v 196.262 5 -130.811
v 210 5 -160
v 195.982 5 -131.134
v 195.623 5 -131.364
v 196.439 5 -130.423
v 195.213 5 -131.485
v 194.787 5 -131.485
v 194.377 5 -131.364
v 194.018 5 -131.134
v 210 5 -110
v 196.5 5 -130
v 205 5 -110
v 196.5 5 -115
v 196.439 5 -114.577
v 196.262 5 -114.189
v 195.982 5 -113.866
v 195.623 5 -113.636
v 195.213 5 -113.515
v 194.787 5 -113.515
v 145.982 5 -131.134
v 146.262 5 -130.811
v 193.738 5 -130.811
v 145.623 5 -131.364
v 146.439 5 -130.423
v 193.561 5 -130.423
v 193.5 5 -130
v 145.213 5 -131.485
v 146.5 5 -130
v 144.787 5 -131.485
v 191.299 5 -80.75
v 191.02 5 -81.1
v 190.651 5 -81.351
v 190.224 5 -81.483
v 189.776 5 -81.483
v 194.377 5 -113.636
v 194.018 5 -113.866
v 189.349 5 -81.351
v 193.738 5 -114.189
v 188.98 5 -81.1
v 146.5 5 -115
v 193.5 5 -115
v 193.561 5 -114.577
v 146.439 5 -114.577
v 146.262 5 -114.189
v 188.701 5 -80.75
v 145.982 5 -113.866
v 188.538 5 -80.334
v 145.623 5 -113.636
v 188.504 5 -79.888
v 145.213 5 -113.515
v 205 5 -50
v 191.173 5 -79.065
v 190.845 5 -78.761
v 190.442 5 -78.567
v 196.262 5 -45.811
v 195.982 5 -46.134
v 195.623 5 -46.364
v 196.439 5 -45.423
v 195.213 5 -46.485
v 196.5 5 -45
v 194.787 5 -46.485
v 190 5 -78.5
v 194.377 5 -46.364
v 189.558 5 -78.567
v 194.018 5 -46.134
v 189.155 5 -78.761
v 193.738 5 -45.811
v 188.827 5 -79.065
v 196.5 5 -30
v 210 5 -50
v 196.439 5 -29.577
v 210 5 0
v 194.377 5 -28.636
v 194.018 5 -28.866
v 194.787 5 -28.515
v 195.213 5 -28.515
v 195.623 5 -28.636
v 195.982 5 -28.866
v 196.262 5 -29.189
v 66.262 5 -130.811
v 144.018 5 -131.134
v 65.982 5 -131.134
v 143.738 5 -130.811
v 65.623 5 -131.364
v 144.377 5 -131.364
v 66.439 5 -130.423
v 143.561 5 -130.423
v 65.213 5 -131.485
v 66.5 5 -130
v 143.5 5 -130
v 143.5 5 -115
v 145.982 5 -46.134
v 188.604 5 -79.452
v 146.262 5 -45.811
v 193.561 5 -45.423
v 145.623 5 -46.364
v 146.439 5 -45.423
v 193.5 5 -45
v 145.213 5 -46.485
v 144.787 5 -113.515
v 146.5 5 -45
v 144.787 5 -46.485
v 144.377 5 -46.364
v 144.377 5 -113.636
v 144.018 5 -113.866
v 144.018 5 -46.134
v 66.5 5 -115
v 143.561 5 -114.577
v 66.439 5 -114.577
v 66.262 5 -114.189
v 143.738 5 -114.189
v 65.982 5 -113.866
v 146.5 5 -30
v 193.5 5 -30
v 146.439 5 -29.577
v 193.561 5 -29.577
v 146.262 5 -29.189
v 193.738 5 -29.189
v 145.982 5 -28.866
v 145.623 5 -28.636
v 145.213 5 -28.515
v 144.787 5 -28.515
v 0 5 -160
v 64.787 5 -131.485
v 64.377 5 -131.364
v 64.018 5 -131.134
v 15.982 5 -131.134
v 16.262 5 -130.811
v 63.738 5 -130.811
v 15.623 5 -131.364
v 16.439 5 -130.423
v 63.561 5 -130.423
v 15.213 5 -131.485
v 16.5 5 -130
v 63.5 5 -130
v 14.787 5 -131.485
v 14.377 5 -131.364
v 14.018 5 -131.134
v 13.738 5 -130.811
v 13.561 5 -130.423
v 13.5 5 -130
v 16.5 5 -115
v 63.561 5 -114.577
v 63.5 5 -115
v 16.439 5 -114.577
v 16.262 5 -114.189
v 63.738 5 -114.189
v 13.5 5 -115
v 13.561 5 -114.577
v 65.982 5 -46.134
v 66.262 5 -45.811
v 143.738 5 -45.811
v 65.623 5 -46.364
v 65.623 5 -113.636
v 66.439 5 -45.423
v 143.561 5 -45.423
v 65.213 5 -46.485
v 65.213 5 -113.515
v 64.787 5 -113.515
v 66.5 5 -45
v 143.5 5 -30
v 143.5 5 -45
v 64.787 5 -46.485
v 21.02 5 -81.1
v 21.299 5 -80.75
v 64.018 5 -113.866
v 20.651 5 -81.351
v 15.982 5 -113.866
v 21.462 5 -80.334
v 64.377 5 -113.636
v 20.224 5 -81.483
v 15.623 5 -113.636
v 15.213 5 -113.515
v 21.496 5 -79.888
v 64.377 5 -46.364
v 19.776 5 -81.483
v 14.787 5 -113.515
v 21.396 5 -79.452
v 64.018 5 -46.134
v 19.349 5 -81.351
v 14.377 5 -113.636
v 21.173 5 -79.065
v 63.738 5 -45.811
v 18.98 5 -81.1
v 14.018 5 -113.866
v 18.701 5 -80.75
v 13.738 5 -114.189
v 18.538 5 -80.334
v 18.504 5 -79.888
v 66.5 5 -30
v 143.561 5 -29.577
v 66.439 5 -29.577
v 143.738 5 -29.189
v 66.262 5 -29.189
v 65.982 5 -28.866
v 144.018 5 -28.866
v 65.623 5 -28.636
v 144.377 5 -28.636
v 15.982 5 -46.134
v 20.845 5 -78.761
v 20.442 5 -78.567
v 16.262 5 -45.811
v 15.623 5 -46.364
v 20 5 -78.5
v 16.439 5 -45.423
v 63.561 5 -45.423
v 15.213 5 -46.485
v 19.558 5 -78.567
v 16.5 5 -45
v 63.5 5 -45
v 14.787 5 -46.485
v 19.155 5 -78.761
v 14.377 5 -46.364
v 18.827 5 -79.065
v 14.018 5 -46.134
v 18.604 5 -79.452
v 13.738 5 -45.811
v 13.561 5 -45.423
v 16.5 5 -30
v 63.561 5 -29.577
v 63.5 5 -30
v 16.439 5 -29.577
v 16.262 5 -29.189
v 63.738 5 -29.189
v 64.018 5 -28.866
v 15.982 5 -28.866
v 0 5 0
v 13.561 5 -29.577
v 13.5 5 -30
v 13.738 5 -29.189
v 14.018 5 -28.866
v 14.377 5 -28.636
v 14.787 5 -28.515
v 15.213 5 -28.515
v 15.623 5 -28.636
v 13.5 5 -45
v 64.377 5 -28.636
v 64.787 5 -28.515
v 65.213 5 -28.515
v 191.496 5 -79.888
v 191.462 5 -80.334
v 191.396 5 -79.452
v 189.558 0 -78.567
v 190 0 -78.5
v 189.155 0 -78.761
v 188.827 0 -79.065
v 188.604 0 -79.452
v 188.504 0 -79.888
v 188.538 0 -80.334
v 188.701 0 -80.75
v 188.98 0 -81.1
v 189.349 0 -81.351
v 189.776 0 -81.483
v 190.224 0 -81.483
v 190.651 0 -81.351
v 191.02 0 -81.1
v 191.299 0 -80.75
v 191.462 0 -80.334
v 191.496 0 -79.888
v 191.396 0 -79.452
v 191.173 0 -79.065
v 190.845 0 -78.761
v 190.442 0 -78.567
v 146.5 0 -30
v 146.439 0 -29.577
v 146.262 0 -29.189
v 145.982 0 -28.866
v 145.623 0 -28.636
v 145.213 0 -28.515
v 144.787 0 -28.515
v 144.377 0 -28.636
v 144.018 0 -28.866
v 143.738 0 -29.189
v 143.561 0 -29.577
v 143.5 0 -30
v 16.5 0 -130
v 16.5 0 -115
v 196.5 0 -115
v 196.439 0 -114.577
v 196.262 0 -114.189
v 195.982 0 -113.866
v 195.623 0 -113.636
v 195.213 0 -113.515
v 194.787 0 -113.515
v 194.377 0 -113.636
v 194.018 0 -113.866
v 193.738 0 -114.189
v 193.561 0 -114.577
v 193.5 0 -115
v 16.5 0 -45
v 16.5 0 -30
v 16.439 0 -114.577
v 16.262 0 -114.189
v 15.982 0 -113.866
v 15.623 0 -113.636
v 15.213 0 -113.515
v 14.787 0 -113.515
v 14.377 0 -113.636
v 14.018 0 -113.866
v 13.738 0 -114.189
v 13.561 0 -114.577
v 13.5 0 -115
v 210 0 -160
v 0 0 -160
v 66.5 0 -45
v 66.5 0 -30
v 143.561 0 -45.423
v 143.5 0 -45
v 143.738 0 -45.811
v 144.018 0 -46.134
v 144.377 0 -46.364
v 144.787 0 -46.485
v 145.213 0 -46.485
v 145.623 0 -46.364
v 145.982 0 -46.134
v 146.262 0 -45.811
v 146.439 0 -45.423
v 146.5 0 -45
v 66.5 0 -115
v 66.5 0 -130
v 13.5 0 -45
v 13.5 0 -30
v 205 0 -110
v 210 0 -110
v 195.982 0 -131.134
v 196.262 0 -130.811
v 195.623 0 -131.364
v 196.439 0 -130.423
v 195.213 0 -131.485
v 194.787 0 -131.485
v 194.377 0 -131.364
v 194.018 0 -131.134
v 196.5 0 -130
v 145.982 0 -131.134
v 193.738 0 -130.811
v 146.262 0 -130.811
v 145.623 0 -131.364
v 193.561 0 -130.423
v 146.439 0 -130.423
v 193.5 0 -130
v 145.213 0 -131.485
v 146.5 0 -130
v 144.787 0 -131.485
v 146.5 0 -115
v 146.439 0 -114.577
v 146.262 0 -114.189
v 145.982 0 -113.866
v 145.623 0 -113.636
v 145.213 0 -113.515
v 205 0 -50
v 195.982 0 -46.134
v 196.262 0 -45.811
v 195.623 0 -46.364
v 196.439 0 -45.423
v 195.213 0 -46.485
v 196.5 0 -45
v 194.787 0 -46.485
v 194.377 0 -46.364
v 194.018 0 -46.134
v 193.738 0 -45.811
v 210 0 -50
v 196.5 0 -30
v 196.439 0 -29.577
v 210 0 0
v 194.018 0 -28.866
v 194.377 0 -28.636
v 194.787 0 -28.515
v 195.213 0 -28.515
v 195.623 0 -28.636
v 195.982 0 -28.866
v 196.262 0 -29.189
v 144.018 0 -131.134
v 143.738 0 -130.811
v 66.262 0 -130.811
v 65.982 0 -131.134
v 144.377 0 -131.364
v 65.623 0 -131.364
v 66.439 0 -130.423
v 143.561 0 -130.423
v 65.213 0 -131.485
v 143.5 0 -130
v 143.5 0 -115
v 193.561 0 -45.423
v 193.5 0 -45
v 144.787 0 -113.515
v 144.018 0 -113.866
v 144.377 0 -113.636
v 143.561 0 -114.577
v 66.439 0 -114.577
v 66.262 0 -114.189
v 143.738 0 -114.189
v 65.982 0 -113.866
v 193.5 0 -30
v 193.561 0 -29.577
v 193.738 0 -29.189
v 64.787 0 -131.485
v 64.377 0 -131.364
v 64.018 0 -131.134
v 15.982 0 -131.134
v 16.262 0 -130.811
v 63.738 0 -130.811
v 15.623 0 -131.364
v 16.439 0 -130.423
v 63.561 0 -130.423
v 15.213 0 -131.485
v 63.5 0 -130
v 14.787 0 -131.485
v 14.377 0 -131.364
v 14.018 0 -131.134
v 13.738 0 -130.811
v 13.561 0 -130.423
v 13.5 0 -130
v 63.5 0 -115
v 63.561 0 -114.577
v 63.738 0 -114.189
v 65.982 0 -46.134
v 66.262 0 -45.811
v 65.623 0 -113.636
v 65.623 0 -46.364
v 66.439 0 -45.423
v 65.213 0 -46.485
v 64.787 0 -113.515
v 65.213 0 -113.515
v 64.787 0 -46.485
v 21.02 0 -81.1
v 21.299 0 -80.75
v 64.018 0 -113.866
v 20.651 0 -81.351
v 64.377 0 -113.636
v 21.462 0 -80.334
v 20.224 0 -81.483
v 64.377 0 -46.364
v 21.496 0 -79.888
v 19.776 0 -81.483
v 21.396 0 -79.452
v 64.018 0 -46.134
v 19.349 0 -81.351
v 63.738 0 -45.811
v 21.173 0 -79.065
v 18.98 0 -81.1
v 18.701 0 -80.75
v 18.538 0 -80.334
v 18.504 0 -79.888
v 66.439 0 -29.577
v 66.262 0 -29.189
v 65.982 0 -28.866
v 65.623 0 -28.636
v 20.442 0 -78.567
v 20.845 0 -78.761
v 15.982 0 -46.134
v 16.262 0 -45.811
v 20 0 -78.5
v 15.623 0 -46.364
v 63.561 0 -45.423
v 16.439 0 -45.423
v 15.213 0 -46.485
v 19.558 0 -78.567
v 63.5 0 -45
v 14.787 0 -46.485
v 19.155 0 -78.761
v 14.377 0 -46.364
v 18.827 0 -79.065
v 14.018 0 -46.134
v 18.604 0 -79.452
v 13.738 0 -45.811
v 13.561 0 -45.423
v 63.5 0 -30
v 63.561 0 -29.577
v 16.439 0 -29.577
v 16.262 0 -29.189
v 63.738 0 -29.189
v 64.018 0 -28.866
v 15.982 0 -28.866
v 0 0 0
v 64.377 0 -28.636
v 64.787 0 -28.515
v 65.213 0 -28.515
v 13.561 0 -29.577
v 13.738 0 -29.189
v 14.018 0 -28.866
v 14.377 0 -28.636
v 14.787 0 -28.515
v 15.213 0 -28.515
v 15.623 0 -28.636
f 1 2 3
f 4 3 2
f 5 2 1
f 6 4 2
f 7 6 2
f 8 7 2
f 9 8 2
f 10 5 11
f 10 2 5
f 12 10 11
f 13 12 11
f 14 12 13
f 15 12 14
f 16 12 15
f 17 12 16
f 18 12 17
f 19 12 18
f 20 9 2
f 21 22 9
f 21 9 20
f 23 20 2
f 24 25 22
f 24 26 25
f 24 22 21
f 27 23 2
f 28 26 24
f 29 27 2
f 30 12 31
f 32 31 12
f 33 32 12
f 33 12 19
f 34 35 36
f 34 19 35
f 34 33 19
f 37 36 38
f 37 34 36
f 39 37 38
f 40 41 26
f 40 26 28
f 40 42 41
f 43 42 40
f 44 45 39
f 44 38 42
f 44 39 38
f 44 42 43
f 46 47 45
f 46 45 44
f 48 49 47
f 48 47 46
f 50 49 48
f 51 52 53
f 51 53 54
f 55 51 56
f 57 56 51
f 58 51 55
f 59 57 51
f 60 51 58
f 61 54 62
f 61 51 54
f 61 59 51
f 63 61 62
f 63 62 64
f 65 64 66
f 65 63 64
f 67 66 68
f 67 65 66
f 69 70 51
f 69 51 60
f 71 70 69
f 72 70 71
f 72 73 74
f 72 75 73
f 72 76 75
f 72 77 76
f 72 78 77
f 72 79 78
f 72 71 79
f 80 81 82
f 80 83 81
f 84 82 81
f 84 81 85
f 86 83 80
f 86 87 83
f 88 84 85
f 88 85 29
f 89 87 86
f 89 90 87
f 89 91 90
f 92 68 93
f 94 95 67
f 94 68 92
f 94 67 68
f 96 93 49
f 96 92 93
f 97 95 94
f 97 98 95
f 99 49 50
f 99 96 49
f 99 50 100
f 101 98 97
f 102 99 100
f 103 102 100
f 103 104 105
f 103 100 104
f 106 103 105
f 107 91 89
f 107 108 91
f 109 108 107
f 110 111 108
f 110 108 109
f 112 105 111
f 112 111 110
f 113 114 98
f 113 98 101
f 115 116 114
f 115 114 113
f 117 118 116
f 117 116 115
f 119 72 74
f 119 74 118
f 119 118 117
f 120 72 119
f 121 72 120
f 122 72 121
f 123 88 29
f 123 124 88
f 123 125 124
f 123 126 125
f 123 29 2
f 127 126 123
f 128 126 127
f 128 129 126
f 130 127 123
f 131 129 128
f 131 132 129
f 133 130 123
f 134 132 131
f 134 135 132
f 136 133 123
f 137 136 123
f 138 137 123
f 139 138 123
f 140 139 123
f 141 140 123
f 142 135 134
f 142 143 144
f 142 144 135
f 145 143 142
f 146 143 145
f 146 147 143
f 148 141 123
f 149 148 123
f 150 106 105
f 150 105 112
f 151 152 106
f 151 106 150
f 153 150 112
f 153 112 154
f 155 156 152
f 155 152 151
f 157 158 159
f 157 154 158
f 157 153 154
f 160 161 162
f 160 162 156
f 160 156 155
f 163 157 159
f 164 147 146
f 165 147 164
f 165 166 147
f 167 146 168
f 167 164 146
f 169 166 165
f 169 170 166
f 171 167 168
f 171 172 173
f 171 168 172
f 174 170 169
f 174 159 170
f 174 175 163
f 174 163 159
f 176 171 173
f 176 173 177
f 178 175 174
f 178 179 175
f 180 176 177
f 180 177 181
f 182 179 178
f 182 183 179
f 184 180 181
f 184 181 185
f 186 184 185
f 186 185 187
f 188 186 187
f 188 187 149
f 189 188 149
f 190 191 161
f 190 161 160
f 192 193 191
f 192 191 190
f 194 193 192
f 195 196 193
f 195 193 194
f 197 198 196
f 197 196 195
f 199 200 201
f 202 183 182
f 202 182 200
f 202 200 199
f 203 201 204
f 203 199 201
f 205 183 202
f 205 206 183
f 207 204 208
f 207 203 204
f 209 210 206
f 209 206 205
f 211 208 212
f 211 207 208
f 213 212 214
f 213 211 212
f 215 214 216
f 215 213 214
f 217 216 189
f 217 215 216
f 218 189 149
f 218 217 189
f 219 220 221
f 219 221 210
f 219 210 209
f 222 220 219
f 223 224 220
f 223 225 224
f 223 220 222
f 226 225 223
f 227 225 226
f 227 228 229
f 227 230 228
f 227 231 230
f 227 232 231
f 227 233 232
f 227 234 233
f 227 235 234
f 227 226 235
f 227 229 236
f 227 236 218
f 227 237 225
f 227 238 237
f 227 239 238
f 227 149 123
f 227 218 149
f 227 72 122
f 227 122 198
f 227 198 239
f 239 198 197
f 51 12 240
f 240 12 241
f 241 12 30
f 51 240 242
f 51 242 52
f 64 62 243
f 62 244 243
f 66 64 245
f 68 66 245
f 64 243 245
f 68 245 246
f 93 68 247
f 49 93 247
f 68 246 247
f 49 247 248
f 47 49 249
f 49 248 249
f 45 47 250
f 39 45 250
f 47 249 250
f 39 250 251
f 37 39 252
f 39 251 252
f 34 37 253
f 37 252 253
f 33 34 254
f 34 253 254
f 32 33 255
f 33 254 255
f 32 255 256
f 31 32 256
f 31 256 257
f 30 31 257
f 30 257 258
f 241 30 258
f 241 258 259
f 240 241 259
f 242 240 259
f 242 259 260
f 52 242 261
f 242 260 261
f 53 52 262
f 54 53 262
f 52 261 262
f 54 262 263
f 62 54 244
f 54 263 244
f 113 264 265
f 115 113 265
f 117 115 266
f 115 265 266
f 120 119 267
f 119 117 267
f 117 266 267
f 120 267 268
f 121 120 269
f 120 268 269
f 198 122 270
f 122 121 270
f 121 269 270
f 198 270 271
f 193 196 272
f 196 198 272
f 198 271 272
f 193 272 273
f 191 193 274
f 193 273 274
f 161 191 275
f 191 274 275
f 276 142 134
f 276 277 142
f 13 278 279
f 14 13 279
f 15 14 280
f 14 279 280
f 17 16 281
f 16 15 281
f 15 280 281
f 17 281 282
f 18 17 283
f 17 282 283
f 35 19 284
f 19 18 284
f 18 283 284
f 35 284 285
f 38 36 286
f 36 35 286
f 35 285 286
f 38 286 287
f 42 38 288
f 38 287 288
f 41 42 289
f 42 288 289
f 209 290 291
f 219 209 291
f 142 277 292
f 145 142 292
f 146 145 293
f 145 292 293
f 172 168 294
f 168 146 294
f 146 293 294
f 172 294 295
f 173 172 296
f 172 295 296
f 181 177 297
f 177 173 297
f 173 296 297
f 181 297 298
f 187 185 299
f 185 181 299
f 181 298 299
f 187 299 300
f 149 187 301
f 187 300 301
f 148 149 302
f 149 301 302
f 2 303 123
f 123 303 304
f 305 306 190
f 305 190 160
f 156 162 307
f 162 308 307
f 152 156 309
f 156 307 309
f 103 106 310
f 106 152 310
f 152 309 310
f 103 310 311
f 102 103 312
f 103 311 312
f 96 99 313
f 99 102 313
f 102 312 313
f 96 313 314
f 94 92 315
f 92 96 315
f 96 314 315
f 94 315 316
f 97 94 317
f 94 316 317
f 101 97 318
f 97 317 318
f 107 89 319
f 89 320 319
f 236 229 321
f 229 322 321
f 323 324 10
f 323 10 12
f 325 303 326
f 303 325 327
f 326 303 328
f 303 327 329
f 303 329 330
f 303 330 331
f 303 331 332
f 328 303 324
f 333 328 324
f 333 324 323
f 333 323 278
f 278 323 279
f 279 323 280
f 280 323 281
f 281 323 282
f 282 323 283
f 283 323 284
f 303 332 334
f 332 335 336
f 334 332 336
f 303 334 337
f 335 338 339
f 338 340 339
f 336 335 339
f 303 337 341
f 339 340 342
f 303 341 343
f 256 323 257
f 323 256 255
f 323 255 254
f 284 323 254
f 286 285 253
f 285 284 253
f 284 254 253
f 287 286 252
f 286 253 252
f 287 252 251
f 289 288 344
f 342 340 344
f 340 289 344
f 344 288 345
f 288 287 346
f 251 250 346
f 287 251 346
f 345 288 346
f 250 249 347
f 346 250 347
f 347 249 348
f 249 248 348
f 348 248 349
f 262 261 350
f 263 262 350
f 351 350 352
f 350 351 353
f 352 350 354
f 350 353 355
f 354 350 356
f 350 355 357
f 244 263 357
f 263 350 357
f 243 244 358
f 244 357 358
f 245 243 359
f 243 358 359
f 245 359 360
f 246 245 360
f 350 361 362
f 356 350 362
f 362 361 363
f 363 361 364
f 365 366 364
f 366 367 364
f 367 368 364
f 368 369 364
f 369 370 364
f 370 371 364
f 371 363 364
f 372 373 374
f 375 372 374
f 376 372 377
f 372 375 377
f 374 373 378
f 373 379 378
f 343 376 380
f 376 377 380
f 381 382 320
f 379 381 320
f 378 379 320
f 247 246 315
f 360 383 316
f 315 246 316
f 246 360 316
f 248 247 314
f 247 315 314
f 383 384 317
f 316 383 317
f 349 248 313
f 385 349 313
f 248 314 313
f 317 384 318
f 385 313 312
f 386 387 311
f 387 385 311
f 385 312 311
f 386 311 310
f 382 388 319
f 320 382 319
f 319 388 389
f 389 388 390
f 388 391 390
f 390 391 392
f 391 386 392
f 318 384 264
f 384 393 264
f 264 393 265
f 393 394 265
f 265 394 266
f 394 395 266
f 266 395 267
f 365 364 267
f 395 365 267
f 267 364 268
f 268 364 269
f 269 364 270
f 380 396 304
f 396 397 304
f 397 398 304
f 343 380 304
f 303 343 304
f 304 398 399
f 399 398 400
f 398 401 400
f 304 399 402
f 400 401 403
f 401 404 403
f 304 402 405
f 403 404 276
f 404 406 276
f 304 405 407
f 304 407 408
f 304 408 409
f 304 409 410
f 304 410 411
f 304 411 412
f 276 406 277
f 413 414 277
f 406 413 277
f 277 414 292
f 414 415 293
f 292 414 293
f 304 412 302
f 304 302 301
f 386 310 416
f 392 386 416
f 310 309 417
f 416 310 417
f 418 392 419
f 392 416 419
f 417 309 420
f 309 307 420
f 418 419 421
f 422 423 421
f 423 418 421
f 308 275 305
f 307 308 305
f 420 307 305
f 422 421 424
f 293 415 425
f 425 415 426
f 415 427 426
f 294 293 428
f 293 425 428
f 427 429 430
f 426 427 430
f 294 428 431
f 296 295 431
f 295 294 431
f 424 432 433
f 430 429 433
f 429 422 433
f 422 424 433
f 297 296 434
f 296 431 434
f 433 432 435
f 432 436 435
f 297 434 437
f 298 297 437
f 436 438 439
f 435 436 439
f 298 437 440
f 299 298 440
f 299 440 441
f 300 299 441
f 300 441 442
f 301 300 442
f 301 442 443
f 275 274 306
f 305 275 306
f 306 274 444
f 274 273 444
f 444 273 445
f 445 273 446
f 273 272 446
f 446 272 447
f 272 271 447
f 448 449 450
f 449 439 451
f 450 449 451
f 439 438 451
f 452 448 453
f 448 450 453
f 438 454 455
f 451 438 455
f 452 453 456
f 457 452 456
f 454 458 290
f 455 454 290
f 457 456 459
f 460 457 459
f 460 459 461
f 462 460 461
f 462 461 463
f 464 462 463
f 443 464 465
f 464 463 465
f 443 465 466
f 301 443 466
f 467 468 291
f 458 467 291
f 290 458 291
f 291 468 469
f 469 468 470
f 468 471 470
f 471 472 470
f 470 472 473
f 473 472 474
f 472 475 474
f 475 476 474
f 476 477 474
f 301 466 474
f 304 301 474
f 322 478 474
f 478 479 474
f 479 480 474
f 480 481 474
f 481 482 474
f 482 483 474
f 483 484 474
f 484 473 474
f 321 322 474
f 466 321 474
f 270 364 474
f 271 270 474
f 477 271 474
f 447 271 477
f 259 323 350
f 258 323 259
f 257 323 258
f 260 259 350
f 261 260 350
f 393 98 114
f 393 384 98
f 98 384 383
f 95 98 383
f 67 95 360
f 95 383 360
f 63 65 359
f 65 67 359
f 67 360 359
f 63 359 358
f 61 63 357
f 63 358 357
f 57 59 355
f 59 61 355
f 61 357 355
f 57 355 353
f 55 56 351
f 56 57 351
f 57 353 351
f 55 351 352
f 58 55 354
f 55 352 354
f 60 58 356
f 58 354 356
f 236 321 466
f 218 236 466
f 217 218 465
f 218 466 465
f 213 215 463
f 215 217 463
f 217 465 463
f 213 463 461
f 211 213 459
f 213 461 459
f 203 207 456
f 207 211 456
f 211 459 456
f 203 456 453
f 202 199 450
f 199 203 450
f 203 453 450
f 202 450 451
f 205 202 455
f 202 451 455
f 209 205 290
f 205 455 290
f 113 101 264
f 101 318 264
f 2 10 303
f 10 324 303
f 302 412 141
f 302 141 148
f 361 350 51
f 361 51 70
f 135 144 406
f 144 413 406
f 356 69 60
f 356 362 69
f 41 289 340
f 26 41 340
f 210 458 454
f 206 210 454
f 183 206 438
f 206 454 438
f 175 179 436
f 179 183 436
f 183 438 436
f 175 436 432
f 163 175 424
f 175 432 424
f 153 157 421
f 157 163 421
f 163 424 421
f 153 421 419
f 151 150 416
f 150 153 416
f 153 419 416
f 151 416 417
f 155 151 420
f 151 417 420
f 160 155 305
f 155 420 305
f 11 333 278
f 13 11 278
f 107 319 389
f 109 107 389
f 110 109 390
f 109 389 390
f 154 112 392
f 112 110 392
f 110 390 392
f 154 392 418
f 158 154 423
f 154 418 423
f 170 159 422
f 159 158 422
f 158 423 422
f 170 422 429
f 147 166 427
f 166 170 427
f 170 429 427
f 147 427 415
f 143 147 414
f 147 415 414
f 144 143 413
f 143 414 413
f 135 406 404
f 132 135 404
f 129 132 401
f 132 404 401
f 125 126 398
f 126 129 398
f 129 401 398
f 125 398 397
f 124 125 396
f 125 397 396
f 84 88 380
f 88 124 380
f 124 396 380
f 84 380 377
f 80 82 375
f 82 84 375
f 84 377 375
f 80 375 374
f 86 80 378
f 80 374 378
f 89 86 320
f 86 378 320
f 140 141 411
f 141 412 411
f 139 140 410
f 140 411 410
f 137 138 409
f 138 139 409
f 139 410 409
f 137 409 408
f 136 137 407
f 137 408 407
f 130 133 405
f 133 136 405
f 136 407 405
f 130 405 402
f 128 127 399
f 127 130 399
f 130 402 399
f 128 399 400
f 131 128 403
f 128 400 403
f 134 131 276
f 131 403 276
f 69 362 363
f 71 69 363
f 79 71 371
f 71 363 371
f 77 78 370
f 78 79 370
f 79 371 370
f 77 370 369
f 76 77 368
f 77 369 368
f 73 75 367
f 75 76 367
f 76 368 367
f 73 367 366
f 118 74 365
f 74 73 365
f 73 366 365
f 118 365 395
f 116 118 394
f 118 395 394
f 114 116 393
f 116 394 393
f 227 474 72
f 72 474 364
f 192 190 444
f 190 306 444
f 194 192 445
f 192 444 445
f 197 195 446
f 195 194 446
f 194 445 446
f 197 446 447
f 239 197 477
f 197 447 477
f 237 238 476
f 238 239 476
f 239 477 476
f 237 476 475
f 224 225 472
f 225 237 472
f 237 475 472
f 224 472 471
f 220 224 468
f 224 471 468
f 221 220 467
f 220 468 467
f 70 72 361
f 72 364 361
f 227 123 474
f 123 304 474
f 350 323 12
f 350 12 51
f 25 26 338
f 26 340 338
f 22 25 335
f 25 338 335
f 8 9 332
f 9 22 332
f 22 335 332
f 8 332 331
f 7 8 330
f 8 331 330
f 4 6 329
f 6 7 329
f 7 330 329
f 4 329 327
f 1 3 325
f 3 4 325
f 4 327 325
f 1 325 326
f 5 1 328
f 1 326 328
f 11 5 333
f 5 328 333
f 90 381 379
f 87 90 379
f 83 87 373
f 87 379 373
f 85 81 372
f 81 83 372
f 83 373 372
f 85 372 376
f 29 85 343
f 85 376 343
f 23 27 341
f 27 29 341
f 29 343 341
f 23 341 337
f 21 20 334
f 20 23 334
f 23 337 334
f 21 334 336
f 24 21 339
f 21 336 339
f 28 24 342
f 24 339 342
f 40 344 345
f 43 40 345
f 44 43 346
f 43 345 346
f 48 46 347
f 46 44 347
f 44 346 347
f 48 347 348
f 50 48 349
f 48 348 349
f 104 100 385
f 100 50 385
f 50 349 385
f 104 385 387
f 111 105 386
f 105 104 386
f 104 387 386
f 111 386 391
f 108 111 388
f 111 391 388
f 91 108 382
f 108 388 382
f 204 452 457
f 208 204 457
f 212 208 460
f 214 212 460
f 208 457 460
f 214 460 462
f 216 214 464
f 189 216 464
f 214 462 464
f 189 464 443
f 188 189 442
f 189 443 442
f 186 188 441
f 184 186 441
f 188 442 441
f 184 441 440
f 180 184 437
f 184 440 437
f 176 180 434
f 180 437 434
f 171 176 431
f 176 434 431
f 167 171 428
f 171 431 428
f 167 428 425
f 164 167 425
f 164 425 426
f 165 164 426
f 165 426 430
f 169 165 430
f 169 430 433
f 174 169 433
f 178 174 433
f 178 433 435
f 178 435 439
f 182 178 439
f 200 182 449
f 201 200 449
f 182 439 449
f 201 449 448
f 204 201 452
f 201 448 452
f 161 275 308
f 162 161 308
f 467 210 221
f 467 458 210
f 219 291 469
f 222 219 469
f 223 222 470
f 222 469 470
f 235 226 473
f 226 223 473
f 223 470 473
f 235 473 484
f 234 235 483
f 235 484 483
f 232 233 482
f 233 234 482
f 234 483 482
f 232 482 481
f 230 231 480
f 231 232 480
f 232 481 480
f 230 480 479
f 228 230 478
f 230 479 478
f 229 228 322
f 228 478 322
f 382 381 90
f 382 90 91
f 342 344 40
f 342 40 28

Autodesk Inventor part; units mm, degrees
ref_plane "YZ Plane" through (0, 0, 0) normal (1, 0, 0) x (0, 1, 0)
ref_plane "XZ Plane" through (0, 0, 0) normal (0, 1, 0) x (-1, 0, 0)
ref_plane "XY Plane" through (0, 0, 0) normal (0, 0, 1) x (1, 0, 0)
sketch "Sketch1" plane through (0, 0, 0) normal (0, 1, 0) x (-1, 0, 0)
  line L0 (0, 0) -> (-210, 0)
  line L1 (-210, 0) -> (-210, -160)
  line L2 (-210, -160) -> (0, -160)
  line L3 (75, -80) -> (-210, -80) construction
  line L4 (-105, 0) -> (-105, -160) construction
  line L5 (-40, 0) -> (-40, -160) construction
  line L6 (-133, 0) -> (-133, -160) construction
  line L7 (-15, -130) -> (-15, -115) construction
  line L8 (-15, -130) -> (-15, -115) construction
  line L9 (-13.5, -130) -> (-13.5, -115)
  line L10 (-16.5, -115) -> (-16.5, -130)
  arc A0 (-16.5, -130) -> (-13.5, -130) centre (-15, -130) ccw
  arc A1 (-13.5, -115) -> (-16.5, -115) centre (-15, -115) ccw
  line L11 (-65, -130) -> (-65, -115) construction
  line L12 (-65, -130) -> (-65, -115) construction
  line L13 (-66.5, -130) -> (-66.5, -115)
  line L14 (-63.5, -115) -> (-63.5, -130)
  arc A2 (-66.5, -130) -> (-63.5, -130) centre (-65, -130) ccw
  arc A3 (-63.5, -115) -> (-66.5, -115) centre (-65, -115) ccw
  line L15 (-125, -160) -> (-85, -160)
  line L16 (-85, -160) -> (-85, -155)
  line L17 (-85, -155) -> (-125, -155)
  line L18 (-125, -155) -> (-125, -160)
  line L19 (-195, -130) -> (-195, -115) construction
  line L20 (-195, -130) -> (-195, -115) construction
  line L21 (-196.5, -130) -> (-196.5, -115)
  line L22 (-193.5, -115) -> (-193.5, -130)
  arc A4 (-196.5, -130) -> (-193.5, -130) centre (-195, -130) ccw
  arc A5 (-193.5, -115) -> (-196.5, -115) centre (-195, -115) ccw
  line L23 (-146.5, -115) -> (-146.5, -130)
  line L24 (-145, -130) -> (-145, -115) construction
  line L25 (-143.5, -130) -> (-143.5, -115)
  arc A6 (-146.5, -130) -> (-143.5, -130) centre (-145, -130) ccw
  line L26 (-145, -130) -> (-145, -115) construction
  arc A7 (-143.5, -115) -> (-146.5, -115) centre (-145, -115) ccw
  line L27 (-105, -160) -> (-105, 0) construction
  line L28 (-15, -30) -> (-15, -45) construction
  line L29 (-15, -30) -> (-15, -45) construction
  line L30 (-13.5, -30) -> (-13.5, -45)
  line L31 (-16.5, -45) -> (-16.5, -30)
  arc A8 (-13.5, -30) -> (-16.5, -30) centre (-15, -30) ccw
  arc A9 (-16.5, -45) -> (-13.5, -45) centre (-15, -45) ccw
  line L32 (-63.5, -45) -> (-63.5, -30)
  line L33 (-65, -30) -> (-65, -45) construction
  line L34 (-66.5, -30) -> (-66.5, -45)
  arc A10 (-63.5, -30) -> (-66.5, -30) centre (-65, -30) ccw
  line L35 (-65, -30) -> (-65, -45) construction
  arc A11 (-66.5, -45) -> (-63.5, -45) centre (-65, -45) ccw
  line L36 (-125, 0) -> (-85, 0)
  line L37 (-85, 0) -> (-85, -5)
  line L38 (-85, -5) -> (-125, -5)
  line L39 (-125, -5) -> (-125, 0)
  arc A12 (-193.5, -30) -> (-196.5, -30) centre (-195, -30) ccw
  line L40 (-193.5, -45) -> (-193.5, -30)
  line L41 (-195, -30) -> (-195, -45) construction
  line L42 (-195, -30) -> (-195, -45) construction
  arc A13 (-196.5, -45) -> (-193.5, -45) centre (-195, -45) ccw
  line L43 (-196.5, -30) -> (-196.5, -45)
  line L44 (-146.5, -45) -> (-146.5, -30)
  line L45 (-145, -30) -> (-145, -45) construction
  line L46 (-145, -30) -> (-145, -45) construction
  arc A14 (-146.5, -45) -> (-143.5, -45) centre (-145, -45) ccw
  line L47 (-143.5, -30) -> (-143.5, -45)
  arc A15 (-143.5, -30) -> (-146.5, -30) centre (-145, -30) ccw
  line L48 (-210, -12.5) -> (-210, -62.5)
  line L49 (-210, -62.5) -> (-210, -110)
  line L50 (-210, -110) -> (-205, -110)
  line L51 (-205, -110) -> (-205, -50)
  line L52 (-205, -50) -> (-210, -50)
  line L53 (-210, -50) -> (-210, -12.5)
  line L54 (0, -160) -> (0, 0)
  point P0 (-15, -122.5)
  point P1 (-65, -122.5)
  point P2 (-195, -122.5)
  point P3 (-145, -122.5)
  point P4 (-15, -37.5)
  point P5 (-65, -37.5)
  point P6 (-195, -37.5)
  point P7 (-145, -37.5)
  point P8 (-65, -122.5)
  point P9 (-15, -122.5)
  point P10 (-125, -160)
  point P11 (-85, -160)
  point P12 (-85, 0)
  point P13 (-125, 0)
  point P14 (-195, -122.5)
  dimension "d2" = 15
  dimension "d4" = 30
  dimension "d6" = 1.5
  dimension "d9" = 40
  dimension "d13" = 0
  dimension "d14" = 5
  dimension "d16" = 20
  dimension "d22" = 5
  dimension "d26" = 30
  dimension "d27" = 30
  dimension "d28" = 0
  dimension "d30" = 160
  dimension "d32" = 50
  dimension "d56" = 15
  dimension "d57" = 210
extrude "Extrusion1" add sketch "Sketch1" along normal blind 5 contours L54 L2 L16 L17 L18 L1 L50 L51 L52 L0 L39 L38 L37 | L37 L38 L39 L0 | L2 L18 L17 L16
sketch "Sketch4" plane through (0, 5, 0) normal (0, 1, 0) x (1, 0, 0)
  line L0 (0, 0) -> (210, 0) projected
  line L1 (0, 160) -> (0, 0) projected
  point P0 (20, 80)
  dimension "d76" = 80
  dimension "d77" = 20
hole "Hole3" at (20, 5, -80) direction (0, -1, 0) diameter 3 end through all
sketch "Sketch5" plane through (0, 5, 0) normal (0, 1, 0) x (1, 0, 0)
  line L0 (205, 50) -> (205, 110) projected
  point P0 (0, 0)
  point P1 (190, 80)
  dimension "d85" = 15
  dimension "d86" = 30
hole "Hole4" at (190, 5, -80) direction (0, -1, 0) diameter 3 end through all
properties part number "base_2" material "Acrylic"
